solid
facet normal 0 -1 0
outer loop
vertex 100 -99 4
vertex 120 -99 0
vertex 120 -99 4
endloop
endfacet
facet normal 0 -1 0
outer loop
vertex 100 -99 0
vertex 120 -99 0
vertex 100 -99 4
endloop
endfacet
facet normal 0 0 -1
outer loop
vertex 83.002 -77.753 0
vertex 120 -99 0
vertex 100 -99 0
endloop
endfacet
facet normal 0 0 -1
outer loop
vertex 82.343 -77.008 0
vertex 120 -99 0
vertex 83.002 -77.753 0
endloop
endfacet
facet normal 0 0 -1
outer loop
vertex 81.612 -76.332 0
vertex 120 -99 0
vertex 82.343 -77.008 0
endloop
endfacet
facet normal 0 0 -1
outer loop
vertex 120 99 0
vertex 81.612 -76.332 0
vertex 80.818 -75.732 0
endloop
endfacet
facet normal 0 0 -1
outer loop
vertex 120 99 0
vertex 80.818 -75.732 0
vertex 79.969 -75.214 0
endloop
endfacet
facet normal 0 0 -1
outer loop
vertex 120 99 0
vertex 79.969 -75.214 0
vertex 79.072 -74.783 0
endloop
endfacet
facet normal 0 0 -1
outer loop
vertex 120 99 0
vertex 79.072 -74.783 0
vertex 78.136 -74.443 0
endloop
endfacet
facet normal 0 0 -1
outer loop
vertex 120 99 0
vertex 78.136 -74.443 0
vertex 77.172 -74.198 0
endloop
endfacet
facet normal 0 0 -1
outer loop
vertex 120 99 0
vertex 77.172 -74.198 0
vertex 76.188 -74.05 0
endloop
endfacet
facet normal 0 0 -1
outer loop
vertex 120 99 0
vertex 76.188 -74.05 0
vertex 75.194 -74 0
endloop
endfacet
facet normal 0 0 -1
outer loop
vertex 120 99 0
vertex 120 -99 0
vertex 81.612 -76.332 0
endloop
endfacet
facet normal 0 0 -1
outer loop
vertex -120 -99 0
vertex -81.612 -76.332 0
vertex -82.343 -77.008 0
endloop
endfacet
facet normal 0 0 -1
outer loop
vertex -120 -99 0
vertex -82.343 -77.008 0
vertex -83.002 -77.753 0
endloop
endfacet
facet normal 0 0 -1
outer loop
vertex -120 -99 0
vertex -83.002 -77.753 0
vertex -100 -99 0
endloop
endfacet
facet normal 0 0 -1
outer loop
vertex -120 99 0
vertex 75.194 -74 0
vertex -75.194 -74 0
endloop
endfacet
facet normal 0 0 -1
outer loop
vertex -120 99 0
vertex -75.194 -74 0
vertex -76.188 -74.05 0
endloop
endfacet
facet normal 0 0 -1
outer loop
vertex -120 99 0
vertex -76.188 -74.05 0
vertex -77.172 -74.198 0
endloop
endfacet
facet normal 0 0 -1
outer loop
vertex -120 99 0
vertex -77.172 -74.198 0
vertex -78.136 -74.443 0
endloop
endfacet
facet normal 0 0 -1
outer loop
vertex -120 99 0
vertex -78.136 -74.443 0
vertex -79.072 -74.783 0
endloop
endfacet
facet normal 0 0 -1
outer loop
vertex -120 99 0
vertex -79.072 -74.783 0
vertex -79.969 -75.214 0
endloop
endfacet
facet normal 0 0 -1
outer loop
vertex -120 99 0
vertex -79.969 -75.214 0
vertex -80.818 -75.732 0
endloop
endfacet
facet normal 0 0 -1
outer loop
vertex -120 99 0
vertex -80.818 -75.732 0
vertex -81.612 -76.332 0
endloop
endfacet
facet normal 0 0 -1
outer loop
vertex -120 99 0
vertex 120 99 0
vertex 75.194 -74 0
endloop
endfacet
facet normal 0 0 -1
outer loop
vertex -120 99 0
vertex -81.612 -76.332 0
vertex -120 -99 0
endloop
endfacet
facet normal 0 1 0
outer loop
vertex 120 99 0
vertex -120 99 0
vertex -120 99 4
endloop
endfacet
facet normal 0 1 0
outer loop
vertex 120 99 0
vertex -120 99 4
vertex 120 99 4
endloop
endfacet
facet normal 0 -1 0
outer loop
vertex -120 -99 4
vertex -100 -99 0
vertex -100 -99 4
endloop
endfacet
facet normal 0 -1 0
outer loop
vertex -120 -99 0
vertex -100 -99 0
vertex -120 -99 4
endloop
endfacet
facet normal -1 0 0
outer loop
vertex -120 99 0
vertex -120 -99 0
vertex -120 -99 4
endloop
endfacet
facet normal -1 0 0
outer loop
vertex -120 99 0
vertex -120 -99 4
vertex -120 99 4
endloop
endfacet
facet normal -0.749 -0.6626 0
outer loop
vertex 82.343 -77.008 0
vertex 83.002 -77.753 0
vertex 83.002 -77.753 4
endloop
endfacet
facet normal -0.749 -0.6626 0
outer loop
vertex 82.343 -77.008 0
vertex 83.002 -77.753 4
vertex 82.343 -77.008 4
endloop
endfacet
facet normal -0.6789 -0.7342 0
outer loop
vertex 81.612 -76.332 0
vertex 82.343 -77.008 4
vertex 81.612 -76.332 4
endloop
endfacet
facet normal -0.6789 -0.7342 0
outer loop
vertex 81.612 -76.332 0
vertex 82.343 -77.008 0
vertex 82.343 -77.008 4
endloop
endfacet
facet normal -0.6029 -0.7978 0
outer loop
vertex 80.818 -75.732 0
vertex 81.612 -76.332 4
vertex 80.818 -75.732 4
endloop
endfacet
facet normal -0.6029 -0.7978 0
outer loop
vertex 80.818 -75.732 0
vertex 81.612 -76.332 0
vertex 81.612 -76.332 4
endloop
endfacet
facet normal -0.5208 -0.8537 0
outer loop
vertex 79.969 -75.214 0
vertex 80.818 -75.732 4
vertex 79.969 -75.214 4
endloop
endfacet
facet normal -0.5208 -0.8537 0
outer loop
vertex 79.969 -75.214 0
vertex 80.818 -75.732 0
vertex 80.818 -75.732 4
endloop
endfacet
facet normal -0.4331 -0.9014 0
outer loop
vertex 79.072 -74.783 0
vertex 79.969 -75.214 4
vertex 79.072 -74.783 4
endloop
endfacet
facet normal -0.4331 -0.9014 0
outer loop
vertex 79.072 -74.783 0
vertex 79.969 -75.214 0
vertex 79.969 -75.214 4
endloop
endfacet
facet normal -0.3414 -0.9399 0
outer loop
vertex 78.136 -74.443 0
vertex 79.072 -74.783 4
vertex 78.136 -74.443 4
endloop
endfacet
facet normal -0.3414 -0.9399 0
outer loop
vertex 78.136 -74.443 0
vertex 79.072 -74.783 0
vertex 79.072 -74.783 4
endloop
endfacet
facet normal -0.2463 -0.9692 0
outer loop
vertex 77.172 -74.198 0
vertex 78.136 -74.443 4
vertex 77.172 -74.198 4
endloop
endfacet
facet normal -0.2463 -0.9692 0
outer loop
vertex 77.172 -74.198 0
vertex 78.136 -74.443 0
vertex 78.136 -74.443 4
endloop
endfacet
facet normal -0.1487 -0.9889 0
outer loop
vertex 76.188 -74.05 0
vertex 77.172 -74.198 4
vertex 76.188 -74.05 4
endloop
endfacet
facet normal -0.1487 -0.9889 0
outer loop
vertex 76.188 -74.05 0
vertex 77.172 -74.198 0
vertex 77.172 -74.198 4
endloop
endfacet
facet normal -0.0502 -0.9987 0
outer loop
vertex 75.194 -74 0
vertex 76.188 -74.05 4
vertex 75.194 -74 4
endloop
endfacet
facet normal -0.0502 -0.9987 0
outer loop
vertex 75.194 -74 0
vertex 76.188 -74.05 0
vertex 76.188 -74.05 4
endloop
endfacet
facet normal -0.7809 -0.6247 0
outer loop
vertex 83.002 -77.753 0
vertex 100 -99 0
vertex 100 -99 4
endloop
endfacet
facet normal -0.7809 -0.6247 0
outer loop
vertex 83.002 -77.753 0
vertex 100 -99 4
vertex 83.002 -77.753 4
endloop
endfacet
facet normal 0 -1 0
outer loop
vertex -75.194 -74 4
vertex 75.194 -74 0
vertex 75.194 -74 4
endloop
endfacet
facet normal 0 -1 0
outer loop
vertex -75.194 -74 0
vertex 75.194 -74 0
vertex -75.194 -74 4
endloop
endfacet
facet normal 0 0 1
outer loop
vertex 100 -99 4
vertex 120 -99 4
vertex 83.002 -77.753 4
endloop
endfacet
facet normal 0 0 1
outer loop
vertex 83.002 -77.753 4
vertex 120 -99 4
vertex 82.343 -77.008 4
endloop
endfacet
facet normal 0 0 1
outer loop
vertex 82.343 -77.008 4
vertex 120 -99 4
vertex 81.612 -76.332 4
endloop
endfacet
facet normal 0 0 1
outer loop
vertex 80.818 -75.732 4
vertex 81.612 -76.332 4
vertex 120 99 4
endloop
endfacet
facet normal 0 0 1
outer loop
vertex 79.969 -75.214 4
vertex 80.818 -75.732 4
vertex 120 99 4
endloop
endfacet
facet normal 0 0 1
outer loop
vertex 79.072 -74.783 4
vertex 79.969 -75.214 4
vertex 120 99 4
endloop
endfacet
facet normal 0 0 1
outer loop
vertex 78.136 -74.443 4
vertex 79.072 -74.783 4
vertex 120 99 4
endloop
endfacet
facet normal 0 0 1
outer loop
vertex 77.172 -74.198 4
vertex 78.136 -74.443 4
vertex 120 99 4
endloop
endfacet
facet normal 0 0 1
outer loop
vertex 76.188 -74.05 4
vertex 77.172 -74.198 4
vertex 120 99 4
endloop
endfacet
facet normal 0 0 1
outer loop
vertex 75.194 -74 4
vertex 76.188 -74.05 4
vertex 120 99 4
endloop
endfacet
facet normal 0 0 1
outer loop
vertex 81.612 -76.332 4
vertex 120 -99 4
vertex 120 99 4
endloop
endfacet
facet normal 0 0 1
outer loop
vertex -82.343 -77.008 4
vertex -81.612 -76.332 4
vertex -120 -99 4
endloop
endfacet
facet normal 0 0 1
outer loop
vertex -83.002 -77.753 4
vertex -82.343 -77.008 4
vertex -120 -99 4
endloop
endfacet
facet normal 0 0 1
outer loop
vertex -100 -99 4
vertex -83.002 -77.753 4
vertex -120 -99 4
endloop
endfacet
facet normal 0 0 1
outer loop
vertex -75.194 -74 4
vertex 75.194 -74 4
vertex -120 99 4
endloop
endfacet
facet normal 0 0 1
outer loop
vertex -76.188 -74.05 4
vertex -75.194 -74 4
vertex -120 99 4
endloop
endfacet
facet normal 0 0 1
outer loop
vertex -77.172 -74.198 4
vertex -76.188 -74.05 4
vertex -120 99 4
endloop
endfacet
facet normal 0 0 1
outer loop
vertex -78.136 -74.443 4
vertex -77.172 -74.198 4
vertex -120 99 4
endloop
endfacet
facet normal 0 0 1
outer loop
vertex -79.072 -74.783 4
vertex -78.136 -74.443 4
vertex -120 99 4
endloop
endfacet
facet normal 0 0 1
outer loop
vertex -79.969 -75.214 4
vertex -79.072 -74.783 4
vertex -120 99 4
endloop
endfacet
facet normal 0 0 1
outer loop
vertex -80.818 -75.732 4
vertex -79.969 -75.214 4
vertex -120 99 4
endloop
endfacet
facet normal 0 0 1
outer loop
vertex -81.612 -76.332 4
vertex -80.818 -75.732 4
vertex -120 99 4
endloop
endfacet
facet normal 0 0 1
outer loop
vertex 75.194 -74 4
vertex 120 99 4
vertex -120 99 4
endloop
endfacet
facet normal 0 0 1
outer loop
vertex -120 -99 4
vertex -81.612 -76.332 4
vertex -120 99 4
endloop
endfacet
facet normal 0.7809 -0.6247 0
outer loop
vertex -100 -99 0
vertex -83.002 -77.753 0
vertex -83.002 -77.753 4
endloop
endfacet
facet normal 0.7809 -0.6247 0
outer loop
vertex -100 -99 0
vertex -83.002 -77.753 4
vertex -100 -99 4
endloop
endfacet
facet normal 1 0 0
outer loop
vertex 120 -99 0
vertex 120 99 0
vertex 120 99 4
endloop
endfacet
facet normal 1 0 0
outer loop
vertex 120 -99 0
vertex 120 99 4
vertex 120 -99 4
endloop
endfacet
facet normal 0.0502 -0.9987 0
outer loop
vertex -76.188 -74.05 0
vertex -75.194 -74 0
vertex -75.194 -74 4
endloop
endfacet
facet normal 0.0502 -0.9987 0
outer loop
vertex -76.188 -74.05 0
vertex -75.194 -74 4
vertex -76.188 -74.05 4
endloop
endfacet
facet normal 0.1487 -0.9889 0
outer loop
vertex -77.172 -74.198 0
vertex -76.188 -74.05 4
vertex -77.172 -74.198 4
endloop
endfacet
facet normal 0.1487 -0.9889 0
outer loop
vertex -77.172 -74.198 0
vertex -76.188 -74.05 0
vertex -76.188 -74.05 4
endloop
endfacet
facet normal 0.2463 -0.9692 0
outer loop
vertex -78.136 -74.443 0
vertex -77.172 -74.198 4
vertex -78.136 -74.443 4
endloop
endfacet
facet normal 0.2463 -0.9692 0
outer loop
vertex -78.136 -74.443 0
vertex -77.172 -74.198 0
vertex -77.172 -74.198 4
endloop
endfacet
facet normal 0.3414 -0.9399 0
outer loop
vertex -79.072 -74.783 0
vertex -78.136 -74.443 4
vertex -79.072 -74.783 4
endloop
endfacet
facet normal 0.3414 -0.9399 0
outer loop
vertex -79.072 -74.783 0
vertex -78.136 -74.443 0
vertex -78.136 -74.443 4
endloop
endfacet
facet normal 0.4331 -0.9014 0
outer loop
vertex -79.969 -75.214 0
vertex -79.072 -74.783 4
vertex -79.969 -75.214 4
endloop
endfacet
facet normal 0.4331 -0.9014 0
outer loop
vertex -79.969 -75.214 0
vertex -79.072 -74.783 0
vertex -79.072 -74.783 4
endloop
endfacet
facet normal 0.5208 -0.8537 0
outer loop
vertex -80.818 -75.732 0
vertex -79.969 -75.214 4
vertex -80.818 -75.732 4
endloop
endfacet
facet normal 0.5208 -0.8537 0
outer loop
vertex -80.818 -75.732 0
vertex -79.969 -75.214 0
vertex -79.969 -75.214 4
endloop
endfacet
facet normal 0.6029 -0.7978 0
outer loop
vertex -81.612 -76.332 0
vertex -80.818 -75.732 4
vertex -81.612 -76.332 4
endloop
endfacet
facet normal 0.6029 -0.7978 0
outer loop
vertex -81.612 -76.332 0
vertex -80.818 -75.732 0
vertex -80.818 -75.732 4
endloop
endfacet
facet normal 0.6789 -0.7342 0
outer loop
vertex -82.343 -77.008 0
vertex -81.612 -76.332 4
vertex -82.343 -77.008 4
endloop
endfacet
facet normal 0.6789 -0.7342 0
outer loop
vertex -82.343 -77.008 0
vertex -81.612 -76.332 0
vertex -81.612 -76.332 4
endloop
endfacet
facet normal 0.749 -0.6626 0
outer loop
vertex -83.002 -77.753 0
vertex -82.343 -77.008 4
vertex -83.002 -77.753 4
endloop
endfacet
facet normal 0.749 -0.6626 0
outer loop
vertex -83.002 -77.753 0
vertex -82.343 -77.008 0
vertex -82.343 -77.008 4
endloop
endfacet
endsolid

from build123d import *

# Parameters (mm, degrees)
BOSS_EXTRUDE1_DEPTH = 4


with BuildPart() as part:
    # Sketch1 → Boss-Extrude1 (new body)
    with BuildSketch(Plane.XY):
        with BuildLine():
            Line((-120, -99), (-120, 99))
            Line((-120, 99), (120, 99))
            Line((120, 99), (120, -99))
            Line((120, -99), (100, -99))
            Line((100, -99), (83.00243962, -77.753049524))
            ThreePointArc((83.00243962, -77.753049524), (79.52563883, -74.986967637), (75.193751525, -74))
            Line((75.193751525, -74), (-75.193751525, -74))
            ThreePointArc((-75.193751525, -74), (-79.52563883, -74.986967637), (-83.00243962, -77.753049524))
            Line((-83.00243962, -77.753049524), (-100, -99))
            Line((-100, -99), (-120, -99))
        make_face()
    extrude(amount=BOSS_EXTRUDE1_DEPTH)


solid = part.part
